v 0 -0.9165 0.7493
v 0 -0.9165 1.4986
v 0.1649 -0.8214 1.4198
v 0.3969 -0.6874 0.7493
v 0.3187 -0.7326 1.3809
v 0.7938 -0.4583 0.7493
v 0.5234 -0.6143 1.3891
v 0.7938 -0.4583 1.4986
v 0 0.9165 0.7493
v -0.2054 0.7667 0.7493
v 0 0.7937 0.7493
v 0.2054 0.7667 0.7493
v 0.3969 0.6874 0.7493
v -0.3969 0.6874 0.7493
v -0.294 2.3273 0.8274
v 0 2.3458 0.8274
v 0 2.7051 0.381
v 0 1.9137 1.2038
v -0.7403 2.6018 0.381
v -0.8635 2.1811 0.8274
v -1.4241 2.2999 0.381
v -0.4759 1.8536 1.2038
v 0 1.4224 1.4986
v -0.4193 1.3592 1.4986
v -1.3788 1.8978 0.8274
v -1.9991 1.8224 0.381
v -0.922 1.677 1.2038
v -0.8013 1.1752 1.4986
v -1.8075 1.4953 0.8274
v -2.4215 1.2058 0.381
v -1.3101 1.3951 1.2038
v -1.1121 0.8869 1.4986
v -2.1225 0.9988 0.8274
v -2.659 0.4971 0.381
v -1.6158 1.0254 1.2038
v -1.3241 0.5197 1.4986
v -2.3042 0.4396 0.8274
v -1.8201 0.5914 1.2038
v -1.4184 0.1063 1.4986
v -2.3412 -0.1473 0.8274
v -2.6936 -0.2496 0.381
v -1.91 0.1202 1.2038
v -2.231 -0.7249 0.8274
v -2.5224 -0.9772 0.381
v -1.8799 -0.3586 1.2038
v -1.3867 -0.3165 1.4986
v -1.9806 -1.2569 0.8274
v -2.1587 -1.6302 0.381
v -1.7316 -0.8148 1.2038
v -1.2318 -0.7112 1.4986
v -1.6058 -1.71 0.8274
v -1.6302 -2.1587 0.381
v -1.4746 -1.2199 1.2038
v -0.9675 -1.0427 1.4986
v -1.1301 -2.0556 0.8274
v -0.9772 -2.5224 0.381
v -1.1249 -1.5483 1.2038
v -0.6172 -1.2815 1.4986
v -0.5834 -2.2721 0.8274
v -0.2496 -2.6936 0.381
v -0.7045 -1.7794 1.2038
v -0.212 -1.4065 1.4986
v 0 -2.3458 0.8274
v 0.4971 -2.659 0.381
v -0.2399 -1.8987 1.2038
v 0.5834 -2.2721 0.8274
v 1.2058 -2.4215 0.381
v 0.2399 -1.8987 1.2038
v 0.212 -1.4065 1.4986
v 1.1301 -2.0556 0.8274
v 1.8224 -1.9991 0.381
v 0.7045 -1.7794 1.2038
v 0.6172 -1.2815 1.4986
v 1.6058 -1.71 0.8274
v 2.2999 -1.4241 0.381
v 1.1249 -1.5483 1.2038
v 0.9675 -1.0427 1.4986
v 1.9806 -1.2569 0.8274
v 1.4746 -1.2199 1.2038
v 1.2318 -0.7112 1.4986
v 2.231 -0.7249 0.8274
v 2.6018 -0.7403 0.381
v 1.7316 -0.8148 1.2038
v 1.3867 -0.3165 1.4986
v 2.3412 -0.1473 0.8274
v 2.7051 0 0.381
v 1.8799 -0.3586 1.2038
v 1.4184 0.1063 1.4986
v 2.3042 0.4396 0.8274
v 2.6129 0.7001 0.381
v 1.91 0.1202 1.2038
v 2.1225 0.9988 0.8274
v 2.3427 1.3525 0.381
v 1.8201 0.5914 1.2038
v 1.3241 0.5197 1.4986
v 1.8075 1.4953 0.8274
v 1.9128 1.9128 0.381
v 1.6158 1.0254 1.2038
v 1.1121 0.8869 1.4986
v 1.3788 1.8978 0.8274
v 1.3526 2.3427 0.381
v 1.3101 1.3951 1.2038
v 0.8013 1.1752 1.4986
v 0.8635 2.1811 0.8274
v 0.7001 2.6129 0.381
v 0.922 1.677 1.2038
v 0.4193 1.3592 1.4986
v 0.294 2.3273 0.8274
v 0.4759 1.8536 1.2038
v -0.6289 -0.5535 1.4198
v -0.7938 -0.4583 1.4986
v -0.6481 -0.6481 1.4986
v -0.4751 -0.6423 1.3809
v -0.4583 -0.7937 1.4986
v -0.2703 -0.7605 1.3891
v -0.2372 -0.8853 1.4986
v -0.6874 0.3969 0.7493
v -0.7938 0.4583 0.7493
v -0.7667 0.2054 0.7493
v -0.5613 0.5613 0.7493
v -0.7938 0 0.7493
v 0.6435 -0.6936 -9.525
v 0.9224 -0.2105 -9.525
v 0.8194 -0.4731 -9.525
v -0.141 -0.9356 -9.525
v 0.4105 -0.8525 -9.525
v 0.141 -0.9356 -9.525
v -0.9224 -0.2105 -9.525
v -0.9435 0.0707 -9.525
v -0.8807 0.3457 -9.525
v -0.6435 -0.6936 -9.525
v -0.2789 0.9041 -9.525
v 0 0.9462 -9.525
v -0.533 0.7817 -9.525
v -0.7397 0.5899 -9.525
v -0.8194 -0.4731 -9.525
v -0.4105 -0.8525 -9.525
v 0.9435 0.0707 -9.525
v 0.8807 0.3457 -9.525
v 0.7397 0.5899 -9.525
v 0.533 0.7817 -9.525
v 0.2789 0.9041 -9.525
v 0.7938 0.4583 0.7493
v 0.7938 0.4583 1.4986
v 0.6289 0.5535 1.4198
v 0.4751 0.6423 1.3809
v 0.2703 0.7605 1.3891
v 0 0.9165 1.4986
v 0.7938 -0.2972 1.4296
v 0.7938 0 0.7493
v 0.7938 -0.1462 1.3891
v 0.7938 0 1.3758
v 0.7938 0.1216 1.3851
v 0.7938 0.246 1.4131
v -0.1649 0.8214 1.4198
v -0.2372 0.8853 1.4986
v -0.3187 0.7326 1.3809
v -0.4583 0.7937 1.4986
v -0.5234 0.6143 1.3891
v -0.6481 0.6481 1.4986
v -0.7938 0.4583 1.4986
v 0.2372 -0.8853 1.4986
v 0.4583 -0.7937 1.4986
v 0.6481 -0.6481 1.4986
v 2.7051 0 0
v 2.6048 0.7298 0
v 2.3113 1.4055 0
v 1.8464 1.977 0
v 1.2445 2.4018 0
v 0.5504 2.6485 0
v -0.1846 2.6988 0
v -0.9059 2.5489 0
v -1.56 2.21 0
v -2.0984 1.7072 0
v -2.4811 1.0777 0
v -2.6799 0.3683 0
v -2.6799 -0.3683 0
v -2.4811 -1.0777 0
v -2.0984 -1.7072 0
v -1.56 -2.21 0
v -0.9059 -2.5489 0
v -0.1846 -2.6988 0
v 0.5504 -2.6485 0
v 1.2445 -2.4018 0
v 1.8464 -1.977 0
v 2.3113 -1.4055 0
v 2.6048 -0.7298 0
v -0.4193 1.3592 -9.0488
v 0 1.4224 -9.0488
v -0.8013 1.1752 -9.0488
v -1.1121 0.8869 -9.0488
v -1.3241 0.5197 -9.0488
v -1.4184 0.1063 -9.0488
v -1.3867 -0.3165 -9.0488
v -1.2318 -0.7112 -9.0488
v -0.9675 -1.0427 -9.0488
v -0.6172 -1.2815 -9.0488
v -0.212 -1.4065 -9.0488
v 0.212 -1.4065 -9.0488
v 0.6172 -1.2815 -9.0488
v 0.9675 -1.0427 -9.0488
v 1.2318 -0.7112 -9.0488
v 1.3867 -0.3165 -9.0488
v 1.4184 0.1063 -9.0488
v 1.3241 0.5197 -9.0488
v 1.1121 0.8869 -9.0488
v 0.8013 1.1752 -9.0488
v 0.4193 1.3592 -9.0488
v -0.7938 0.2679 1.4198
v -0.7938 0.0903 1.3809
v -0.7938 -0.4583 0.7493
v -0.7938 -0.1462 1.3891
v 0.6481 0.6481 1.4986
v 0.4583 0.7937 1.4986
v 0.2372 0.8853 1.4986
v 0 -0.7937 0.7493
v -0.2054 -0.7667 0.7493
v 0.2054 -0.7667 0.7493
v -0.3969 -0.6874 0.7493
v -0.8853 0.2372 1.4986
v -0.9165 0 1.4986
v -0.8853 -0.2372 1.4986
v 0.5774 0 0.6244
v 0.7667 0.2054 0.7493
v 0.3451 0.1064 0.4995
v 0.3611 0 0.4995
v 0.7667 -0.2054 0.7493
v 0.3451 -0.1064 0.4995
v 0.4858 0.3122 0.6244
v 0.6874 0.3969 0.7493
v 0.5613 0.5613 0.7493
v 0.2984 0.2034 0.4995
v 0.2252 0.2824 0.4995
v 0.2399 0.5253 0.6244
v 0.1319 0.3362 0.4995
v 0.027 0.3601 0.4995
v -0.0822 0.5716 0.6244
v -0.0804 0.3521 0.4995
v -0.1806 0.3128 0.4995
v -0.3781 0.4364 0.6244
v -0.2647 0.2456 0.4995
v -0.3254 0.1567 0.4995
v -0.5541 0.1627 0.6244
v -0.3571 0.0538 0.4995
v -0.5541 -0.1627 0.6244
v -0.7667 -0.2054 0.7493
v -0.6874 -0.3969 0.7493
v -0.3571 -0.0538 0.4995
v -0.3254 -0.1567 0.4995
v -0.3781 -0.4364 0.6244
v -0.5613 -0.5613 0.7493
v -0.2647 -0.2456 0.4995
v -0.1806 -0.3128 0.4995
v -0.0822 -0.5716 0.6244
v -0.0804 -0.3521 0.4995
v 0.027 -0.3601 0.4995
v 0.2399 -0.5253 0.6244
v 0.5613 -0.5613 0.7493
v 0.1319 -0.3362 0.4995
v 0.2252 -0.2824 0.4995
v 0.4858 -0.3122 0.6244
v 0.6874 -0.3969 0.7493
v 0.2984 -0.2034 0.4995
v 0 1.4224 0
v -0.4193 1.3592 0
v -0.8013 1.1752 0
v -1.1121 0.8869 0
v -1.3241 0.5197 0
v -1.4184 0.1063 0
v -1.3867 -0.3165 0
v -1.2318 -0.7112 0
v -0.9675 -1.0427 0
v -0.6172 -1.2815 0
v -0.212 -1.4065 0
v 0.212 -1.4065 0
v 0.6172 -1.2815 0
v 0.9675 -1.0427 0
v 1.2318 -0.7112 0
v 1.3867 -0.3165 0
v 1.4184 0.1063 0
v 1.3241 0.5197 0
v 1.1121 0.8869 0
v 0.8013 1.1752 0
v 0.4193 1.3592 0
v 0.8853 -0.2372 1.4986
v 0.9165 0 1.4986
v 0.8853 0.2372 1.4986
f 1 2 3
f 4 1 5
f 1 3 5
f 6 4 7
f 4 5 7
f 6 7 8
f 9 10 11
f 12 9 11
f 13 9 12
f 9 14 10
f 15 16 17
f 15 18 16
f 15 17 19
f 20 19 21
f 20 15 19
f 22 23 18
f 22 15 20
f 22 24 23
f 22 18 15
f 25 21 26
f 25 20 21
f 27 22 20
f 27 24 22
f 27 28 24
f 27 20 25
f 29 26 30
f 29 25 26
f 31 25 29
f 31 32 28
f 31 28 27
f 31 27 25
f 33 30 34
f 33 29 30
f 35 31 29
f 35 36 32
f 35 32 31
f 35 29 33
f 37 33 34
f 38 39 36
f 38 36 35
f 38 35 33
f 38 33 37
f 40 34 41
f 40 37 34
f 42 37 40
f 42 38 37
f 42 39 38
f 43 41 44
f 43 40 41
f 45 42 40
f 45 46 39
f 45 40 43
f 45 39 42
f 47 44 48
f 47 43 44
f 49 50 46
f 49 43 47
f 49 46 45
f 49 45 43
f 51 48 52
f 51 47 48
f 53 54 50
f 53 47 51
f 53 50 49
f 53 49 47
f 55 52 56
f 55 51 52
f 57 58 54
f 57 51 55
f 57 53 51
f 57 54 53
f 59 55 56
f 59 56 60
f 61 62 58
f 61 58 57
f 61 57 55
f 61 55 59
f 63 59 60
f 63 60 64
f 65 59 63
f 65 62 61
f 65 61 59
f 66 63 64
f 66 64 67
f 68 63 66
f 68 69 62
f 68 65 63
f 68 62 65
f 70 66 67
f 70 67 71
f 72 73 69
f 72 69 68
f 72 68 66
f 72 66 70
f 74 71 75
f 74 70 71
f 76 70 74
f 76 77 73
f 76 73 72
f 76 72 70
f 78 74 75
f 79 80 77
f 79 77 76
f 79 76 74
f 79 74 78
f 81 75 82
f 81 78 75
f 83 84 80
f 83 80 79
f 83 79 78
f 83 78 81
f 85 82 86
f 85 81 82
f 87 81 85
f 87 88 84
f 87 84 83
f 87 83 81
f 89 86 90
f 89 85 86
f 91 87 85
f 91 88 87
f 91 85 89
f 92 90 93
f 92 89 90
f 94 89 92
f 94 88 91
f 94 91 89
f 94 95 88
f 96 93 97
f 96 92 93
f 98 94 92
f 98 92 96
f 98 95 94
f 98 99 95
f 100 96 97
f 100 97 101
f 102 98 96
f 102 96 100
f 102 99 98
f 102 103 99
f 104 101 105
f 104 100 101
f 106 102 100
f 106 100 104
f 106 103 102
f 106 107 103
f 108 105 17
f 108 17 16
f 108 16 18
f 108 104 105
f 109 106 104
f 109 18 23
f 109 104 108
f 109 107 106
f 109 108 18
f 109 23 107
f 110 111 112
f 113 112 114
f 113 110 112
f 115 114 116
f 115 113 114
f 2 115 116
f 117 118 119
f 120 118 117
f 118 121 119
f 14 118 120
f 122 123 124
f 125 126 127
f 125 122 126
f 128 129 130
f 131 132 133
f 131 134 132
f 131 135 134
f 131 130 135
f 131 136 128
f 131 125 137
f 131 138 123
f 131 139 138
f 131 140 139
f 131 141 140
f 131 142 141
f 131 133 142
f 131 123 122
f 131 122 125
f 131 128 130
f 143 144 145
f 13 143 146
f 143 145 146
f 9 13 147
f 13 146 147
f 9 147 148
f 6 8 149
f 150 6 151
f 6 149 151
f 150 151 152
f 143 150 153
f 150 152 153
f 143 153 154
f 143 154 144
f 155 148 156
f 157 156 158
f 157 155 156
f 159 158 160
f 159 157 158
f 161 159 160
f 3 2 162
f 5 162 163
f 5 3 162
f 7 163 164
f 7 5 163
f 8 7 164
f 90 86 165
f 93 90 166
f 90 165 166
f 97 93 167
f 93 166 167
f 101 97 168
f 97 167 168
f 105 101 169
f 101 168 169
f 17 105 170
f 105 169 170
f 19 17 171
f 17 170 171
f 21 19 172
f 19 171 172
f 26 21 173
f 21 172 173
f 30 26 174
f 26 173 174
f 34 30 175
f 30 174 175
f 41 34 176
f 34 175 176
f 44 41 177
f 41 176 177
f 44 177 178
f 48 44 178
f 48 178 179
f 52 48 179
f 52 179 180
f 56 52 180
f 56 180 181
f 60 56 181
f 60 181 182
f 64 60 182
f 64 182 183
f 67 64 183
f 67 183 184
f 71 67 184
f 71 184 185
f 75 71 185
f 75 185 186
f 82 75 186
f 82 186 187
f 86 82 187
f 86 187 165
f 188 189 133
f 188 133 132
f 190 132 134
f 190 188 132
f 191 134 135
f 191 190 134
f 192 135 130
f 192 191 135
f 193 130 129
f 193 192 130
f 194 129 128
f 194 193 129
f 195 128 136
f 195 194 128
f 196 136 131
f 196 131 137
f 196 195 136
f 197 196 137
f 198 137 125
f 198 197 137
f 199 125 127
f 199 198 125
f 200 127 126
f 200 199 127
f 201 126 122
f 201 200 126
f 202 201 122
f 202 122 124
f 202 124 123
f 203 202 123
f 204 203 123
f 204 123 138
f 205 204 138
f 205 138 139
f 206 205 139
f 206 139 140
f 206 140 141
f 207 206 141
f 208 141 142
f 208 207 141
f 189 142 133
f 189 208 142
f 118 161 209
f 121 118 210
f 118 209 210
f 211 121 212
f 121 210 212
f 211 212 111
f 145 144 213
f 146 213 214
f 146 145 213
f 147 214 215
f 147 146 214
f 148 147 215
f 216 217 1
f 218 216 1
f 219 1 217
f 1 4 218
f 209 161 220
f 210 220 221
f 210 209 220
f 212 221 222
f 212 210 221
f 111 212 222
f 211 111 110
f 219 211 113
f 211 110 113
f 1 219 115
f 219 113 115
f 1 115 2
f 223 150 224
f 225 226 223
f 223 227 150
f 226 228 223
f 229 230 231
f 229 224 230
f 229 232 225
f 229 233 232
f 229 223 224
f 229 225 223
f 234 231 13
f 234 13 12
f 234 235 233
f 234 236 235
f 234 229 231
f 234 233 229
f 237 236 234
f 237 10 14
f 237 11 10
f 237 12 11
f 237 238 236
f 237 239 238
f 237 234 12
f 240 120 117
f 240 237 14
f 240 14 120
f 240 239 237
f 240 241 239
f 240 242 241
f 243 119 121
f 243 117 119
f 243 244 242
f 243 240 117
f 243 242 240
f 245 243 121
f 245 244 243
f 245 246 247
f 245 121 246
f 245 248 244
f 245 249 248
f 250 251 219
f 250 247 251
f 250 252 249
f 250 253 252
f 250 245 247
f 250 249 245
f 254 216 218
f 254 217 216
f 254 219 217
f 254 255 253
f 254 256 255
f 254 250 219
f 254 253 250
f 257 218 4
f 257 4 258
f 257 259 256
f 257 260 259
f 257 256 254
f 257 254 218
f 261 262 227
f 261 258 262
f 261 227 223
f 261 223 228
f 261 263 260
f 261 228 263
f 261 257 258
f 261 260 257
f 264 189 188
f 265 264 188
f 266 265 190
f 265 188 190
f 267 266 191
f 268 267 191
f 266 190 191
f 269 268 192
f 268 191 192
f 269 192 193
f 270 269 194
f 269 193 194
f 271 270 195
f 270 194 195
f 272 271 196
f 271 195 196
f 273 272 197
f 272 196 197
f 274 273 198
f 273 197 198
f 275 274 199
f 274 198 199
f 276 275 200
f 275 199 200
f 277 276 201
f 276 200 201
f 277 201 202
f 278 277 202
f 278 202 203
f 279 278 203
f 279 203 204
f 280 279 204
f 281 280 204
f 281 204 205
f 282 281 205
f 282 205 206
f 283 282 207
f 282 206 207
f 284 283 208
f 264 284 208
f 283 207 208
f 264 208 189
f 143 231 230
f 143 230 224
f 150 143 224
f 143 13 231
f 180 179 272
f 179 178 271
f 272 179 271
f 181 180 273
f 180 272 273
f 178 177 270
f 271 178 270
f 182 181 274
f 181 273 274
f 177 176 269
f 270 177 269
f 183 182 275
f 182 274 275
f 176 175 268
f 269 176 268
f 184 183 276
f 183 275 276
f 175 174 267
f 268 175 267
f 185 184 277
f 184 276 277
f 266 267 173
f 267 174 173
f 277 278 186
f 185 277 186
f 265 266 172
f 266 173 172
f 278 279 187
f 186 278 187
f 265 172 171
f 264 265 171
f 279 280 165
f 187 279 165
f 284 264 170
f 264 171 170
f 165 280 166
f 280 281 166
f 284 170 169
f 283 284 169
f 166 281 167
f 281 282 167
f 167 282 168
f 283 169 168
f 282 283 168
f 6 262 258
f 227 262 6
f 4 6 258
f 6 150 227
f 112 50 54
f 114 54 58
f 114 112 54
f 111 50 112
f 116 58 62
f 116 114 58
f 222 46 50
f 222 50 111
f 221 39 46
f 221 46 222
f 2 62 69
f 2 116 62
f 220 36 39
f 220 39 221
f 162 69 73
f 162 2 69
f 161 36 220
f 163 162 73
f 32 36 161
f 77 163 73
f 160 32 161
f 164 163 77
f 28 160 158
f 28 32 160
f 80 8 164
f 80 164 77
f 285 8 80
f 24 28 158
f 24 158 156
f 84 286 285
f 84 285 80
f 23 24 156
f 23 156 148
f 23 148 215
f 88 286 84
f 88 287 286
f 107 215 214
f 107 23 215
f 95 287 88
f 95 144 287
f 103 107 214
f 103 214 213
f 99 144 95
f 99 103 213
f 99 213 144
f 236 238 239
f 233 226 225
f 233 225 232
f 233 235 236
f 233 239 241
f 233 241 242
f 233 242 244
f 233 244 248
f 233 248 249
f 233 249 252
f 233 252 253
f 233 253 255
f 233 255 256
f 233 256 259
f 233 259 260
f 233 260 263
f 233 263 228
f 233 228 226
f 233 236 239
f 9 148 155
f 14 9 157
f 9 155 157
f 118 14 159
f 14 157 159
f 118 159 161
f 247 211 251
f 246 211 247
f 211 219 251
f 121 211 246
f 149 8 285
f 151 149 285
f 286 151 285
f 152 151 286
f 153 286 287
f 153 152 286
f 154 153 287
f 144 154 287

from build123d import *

# Parameters (mm, degrees)
SKETCH1_W          = 9.525
SKETCH1_H          = 1.4224
CHAMFER1_SIZE      = 0.47625
SKETCH4_R          = 2.7051
EXTRUDE1_DEPTH     = 1.4986
CUT_EXTRUDE1_DEPTH = 0.7493
SKETCH7_R          = 0.916543552
CUT_EXTRUDE4_DEPTH = 0.7493
CUT_EXTRUDE4_TAPER = 45
SKETCH8_R          = 0.79375
CUT_EXTRUDE5_DEPTH = 0.249766667
CUT_EXTRUDE5_TAPER = 60


with BuildPart() as part:
    # Sketch1 → Revolve1 (revolve)
    with BuildSketch(Plane(origin=(0, 0, 0), x_dir=(0, 0, -1), z_dir=(1, 0, 0))):
        with Locations((4.7625, 0.7112)):
            Rectangle(SKETCH1_W, SKETCH1_H)
    revolve(axis=Axis((0, 0, 0), (0, 0, 1)))

    # Chamfer1
    chamfer1_edges = [part.edges().sort_by_distance(p)[0] for p in [
        (0, -1.4224, -9.525),
    ]]
    chamfer(chamfer1_edges, length=CHAMFER1_SIZE)

    # Sketch4 → Extrude1 (add)
    with BuildSketch(Plane.XY):
        Circle(SKETCH4_R)
    extrude(amount=EXTRUDE1_DEPTH)

    # Sketch9 → Cut-Revolve3 (revolve, cut)
    with BuildSketch(Plane(origin=(0, 0, 0), x_dir=(0, 0, -1), z_dir=(1, 0, 0))):
        with BuildLine():
            Line((0, 2.7051), (-0.381, 2.7051))
            ThreePointArc((-0.381, 2.7051), (-1.025093234, 2.138064897), (-1.4986, 1.4224))
            Line((-1.4986, 1.4224), (-1.8796, 1.4224))
            Line((-1.8796, 1.4224), (-1.8796, 3.0861))
            Line((-1.8796, 3.0861), (0, 3.0861))
            Line((0, 3.0861), (0, 2.7051))
        make_face()
    revolve(axis=Axis((0, 0, 0), (0, 0, 1)), mode=Mode.SUBTRACT)

    # Sketch6 → Cut-Extrude1 (cut)
    with BuildSketch(Plane.XY.offset(1.4986)):
        Polygon((0, -0.916543552), (0.79375, -0.458271776), (0.79375, 0.458271776), (0, 0.916543552), (-0.79375, 0.458271776), (-0.79375, -0.458271776), align=None)
    extrude(amount=-CUT_EXTRUDE1_DEPTH, mode=Mode.SUBTRACT)

    # Sketch7 → Cut-Extrude4 (cut)
    with BuildSketch(Plane.XY.offset(1.4986)):
        Circle(SKETCH7_R)
    extrude(amount=-CUT_EXTRUDE4_DEPTH, taper=CUT_EXTRUDE4_TAPER, mode=Mode.SUBTRACT)

    # Sketch8 → Cut-Extrude5 (cut)
    with BuildSketch(Plane.XY.offset(0.7493)):
        Circle(SKETCH8_R)
    extrude(amount=-CUT_EXTRUDE5_DEPTH, taper=CUT_EXTRUDE5_TAPER, mode=Mode.SUBTRACT)


solid = part.part
